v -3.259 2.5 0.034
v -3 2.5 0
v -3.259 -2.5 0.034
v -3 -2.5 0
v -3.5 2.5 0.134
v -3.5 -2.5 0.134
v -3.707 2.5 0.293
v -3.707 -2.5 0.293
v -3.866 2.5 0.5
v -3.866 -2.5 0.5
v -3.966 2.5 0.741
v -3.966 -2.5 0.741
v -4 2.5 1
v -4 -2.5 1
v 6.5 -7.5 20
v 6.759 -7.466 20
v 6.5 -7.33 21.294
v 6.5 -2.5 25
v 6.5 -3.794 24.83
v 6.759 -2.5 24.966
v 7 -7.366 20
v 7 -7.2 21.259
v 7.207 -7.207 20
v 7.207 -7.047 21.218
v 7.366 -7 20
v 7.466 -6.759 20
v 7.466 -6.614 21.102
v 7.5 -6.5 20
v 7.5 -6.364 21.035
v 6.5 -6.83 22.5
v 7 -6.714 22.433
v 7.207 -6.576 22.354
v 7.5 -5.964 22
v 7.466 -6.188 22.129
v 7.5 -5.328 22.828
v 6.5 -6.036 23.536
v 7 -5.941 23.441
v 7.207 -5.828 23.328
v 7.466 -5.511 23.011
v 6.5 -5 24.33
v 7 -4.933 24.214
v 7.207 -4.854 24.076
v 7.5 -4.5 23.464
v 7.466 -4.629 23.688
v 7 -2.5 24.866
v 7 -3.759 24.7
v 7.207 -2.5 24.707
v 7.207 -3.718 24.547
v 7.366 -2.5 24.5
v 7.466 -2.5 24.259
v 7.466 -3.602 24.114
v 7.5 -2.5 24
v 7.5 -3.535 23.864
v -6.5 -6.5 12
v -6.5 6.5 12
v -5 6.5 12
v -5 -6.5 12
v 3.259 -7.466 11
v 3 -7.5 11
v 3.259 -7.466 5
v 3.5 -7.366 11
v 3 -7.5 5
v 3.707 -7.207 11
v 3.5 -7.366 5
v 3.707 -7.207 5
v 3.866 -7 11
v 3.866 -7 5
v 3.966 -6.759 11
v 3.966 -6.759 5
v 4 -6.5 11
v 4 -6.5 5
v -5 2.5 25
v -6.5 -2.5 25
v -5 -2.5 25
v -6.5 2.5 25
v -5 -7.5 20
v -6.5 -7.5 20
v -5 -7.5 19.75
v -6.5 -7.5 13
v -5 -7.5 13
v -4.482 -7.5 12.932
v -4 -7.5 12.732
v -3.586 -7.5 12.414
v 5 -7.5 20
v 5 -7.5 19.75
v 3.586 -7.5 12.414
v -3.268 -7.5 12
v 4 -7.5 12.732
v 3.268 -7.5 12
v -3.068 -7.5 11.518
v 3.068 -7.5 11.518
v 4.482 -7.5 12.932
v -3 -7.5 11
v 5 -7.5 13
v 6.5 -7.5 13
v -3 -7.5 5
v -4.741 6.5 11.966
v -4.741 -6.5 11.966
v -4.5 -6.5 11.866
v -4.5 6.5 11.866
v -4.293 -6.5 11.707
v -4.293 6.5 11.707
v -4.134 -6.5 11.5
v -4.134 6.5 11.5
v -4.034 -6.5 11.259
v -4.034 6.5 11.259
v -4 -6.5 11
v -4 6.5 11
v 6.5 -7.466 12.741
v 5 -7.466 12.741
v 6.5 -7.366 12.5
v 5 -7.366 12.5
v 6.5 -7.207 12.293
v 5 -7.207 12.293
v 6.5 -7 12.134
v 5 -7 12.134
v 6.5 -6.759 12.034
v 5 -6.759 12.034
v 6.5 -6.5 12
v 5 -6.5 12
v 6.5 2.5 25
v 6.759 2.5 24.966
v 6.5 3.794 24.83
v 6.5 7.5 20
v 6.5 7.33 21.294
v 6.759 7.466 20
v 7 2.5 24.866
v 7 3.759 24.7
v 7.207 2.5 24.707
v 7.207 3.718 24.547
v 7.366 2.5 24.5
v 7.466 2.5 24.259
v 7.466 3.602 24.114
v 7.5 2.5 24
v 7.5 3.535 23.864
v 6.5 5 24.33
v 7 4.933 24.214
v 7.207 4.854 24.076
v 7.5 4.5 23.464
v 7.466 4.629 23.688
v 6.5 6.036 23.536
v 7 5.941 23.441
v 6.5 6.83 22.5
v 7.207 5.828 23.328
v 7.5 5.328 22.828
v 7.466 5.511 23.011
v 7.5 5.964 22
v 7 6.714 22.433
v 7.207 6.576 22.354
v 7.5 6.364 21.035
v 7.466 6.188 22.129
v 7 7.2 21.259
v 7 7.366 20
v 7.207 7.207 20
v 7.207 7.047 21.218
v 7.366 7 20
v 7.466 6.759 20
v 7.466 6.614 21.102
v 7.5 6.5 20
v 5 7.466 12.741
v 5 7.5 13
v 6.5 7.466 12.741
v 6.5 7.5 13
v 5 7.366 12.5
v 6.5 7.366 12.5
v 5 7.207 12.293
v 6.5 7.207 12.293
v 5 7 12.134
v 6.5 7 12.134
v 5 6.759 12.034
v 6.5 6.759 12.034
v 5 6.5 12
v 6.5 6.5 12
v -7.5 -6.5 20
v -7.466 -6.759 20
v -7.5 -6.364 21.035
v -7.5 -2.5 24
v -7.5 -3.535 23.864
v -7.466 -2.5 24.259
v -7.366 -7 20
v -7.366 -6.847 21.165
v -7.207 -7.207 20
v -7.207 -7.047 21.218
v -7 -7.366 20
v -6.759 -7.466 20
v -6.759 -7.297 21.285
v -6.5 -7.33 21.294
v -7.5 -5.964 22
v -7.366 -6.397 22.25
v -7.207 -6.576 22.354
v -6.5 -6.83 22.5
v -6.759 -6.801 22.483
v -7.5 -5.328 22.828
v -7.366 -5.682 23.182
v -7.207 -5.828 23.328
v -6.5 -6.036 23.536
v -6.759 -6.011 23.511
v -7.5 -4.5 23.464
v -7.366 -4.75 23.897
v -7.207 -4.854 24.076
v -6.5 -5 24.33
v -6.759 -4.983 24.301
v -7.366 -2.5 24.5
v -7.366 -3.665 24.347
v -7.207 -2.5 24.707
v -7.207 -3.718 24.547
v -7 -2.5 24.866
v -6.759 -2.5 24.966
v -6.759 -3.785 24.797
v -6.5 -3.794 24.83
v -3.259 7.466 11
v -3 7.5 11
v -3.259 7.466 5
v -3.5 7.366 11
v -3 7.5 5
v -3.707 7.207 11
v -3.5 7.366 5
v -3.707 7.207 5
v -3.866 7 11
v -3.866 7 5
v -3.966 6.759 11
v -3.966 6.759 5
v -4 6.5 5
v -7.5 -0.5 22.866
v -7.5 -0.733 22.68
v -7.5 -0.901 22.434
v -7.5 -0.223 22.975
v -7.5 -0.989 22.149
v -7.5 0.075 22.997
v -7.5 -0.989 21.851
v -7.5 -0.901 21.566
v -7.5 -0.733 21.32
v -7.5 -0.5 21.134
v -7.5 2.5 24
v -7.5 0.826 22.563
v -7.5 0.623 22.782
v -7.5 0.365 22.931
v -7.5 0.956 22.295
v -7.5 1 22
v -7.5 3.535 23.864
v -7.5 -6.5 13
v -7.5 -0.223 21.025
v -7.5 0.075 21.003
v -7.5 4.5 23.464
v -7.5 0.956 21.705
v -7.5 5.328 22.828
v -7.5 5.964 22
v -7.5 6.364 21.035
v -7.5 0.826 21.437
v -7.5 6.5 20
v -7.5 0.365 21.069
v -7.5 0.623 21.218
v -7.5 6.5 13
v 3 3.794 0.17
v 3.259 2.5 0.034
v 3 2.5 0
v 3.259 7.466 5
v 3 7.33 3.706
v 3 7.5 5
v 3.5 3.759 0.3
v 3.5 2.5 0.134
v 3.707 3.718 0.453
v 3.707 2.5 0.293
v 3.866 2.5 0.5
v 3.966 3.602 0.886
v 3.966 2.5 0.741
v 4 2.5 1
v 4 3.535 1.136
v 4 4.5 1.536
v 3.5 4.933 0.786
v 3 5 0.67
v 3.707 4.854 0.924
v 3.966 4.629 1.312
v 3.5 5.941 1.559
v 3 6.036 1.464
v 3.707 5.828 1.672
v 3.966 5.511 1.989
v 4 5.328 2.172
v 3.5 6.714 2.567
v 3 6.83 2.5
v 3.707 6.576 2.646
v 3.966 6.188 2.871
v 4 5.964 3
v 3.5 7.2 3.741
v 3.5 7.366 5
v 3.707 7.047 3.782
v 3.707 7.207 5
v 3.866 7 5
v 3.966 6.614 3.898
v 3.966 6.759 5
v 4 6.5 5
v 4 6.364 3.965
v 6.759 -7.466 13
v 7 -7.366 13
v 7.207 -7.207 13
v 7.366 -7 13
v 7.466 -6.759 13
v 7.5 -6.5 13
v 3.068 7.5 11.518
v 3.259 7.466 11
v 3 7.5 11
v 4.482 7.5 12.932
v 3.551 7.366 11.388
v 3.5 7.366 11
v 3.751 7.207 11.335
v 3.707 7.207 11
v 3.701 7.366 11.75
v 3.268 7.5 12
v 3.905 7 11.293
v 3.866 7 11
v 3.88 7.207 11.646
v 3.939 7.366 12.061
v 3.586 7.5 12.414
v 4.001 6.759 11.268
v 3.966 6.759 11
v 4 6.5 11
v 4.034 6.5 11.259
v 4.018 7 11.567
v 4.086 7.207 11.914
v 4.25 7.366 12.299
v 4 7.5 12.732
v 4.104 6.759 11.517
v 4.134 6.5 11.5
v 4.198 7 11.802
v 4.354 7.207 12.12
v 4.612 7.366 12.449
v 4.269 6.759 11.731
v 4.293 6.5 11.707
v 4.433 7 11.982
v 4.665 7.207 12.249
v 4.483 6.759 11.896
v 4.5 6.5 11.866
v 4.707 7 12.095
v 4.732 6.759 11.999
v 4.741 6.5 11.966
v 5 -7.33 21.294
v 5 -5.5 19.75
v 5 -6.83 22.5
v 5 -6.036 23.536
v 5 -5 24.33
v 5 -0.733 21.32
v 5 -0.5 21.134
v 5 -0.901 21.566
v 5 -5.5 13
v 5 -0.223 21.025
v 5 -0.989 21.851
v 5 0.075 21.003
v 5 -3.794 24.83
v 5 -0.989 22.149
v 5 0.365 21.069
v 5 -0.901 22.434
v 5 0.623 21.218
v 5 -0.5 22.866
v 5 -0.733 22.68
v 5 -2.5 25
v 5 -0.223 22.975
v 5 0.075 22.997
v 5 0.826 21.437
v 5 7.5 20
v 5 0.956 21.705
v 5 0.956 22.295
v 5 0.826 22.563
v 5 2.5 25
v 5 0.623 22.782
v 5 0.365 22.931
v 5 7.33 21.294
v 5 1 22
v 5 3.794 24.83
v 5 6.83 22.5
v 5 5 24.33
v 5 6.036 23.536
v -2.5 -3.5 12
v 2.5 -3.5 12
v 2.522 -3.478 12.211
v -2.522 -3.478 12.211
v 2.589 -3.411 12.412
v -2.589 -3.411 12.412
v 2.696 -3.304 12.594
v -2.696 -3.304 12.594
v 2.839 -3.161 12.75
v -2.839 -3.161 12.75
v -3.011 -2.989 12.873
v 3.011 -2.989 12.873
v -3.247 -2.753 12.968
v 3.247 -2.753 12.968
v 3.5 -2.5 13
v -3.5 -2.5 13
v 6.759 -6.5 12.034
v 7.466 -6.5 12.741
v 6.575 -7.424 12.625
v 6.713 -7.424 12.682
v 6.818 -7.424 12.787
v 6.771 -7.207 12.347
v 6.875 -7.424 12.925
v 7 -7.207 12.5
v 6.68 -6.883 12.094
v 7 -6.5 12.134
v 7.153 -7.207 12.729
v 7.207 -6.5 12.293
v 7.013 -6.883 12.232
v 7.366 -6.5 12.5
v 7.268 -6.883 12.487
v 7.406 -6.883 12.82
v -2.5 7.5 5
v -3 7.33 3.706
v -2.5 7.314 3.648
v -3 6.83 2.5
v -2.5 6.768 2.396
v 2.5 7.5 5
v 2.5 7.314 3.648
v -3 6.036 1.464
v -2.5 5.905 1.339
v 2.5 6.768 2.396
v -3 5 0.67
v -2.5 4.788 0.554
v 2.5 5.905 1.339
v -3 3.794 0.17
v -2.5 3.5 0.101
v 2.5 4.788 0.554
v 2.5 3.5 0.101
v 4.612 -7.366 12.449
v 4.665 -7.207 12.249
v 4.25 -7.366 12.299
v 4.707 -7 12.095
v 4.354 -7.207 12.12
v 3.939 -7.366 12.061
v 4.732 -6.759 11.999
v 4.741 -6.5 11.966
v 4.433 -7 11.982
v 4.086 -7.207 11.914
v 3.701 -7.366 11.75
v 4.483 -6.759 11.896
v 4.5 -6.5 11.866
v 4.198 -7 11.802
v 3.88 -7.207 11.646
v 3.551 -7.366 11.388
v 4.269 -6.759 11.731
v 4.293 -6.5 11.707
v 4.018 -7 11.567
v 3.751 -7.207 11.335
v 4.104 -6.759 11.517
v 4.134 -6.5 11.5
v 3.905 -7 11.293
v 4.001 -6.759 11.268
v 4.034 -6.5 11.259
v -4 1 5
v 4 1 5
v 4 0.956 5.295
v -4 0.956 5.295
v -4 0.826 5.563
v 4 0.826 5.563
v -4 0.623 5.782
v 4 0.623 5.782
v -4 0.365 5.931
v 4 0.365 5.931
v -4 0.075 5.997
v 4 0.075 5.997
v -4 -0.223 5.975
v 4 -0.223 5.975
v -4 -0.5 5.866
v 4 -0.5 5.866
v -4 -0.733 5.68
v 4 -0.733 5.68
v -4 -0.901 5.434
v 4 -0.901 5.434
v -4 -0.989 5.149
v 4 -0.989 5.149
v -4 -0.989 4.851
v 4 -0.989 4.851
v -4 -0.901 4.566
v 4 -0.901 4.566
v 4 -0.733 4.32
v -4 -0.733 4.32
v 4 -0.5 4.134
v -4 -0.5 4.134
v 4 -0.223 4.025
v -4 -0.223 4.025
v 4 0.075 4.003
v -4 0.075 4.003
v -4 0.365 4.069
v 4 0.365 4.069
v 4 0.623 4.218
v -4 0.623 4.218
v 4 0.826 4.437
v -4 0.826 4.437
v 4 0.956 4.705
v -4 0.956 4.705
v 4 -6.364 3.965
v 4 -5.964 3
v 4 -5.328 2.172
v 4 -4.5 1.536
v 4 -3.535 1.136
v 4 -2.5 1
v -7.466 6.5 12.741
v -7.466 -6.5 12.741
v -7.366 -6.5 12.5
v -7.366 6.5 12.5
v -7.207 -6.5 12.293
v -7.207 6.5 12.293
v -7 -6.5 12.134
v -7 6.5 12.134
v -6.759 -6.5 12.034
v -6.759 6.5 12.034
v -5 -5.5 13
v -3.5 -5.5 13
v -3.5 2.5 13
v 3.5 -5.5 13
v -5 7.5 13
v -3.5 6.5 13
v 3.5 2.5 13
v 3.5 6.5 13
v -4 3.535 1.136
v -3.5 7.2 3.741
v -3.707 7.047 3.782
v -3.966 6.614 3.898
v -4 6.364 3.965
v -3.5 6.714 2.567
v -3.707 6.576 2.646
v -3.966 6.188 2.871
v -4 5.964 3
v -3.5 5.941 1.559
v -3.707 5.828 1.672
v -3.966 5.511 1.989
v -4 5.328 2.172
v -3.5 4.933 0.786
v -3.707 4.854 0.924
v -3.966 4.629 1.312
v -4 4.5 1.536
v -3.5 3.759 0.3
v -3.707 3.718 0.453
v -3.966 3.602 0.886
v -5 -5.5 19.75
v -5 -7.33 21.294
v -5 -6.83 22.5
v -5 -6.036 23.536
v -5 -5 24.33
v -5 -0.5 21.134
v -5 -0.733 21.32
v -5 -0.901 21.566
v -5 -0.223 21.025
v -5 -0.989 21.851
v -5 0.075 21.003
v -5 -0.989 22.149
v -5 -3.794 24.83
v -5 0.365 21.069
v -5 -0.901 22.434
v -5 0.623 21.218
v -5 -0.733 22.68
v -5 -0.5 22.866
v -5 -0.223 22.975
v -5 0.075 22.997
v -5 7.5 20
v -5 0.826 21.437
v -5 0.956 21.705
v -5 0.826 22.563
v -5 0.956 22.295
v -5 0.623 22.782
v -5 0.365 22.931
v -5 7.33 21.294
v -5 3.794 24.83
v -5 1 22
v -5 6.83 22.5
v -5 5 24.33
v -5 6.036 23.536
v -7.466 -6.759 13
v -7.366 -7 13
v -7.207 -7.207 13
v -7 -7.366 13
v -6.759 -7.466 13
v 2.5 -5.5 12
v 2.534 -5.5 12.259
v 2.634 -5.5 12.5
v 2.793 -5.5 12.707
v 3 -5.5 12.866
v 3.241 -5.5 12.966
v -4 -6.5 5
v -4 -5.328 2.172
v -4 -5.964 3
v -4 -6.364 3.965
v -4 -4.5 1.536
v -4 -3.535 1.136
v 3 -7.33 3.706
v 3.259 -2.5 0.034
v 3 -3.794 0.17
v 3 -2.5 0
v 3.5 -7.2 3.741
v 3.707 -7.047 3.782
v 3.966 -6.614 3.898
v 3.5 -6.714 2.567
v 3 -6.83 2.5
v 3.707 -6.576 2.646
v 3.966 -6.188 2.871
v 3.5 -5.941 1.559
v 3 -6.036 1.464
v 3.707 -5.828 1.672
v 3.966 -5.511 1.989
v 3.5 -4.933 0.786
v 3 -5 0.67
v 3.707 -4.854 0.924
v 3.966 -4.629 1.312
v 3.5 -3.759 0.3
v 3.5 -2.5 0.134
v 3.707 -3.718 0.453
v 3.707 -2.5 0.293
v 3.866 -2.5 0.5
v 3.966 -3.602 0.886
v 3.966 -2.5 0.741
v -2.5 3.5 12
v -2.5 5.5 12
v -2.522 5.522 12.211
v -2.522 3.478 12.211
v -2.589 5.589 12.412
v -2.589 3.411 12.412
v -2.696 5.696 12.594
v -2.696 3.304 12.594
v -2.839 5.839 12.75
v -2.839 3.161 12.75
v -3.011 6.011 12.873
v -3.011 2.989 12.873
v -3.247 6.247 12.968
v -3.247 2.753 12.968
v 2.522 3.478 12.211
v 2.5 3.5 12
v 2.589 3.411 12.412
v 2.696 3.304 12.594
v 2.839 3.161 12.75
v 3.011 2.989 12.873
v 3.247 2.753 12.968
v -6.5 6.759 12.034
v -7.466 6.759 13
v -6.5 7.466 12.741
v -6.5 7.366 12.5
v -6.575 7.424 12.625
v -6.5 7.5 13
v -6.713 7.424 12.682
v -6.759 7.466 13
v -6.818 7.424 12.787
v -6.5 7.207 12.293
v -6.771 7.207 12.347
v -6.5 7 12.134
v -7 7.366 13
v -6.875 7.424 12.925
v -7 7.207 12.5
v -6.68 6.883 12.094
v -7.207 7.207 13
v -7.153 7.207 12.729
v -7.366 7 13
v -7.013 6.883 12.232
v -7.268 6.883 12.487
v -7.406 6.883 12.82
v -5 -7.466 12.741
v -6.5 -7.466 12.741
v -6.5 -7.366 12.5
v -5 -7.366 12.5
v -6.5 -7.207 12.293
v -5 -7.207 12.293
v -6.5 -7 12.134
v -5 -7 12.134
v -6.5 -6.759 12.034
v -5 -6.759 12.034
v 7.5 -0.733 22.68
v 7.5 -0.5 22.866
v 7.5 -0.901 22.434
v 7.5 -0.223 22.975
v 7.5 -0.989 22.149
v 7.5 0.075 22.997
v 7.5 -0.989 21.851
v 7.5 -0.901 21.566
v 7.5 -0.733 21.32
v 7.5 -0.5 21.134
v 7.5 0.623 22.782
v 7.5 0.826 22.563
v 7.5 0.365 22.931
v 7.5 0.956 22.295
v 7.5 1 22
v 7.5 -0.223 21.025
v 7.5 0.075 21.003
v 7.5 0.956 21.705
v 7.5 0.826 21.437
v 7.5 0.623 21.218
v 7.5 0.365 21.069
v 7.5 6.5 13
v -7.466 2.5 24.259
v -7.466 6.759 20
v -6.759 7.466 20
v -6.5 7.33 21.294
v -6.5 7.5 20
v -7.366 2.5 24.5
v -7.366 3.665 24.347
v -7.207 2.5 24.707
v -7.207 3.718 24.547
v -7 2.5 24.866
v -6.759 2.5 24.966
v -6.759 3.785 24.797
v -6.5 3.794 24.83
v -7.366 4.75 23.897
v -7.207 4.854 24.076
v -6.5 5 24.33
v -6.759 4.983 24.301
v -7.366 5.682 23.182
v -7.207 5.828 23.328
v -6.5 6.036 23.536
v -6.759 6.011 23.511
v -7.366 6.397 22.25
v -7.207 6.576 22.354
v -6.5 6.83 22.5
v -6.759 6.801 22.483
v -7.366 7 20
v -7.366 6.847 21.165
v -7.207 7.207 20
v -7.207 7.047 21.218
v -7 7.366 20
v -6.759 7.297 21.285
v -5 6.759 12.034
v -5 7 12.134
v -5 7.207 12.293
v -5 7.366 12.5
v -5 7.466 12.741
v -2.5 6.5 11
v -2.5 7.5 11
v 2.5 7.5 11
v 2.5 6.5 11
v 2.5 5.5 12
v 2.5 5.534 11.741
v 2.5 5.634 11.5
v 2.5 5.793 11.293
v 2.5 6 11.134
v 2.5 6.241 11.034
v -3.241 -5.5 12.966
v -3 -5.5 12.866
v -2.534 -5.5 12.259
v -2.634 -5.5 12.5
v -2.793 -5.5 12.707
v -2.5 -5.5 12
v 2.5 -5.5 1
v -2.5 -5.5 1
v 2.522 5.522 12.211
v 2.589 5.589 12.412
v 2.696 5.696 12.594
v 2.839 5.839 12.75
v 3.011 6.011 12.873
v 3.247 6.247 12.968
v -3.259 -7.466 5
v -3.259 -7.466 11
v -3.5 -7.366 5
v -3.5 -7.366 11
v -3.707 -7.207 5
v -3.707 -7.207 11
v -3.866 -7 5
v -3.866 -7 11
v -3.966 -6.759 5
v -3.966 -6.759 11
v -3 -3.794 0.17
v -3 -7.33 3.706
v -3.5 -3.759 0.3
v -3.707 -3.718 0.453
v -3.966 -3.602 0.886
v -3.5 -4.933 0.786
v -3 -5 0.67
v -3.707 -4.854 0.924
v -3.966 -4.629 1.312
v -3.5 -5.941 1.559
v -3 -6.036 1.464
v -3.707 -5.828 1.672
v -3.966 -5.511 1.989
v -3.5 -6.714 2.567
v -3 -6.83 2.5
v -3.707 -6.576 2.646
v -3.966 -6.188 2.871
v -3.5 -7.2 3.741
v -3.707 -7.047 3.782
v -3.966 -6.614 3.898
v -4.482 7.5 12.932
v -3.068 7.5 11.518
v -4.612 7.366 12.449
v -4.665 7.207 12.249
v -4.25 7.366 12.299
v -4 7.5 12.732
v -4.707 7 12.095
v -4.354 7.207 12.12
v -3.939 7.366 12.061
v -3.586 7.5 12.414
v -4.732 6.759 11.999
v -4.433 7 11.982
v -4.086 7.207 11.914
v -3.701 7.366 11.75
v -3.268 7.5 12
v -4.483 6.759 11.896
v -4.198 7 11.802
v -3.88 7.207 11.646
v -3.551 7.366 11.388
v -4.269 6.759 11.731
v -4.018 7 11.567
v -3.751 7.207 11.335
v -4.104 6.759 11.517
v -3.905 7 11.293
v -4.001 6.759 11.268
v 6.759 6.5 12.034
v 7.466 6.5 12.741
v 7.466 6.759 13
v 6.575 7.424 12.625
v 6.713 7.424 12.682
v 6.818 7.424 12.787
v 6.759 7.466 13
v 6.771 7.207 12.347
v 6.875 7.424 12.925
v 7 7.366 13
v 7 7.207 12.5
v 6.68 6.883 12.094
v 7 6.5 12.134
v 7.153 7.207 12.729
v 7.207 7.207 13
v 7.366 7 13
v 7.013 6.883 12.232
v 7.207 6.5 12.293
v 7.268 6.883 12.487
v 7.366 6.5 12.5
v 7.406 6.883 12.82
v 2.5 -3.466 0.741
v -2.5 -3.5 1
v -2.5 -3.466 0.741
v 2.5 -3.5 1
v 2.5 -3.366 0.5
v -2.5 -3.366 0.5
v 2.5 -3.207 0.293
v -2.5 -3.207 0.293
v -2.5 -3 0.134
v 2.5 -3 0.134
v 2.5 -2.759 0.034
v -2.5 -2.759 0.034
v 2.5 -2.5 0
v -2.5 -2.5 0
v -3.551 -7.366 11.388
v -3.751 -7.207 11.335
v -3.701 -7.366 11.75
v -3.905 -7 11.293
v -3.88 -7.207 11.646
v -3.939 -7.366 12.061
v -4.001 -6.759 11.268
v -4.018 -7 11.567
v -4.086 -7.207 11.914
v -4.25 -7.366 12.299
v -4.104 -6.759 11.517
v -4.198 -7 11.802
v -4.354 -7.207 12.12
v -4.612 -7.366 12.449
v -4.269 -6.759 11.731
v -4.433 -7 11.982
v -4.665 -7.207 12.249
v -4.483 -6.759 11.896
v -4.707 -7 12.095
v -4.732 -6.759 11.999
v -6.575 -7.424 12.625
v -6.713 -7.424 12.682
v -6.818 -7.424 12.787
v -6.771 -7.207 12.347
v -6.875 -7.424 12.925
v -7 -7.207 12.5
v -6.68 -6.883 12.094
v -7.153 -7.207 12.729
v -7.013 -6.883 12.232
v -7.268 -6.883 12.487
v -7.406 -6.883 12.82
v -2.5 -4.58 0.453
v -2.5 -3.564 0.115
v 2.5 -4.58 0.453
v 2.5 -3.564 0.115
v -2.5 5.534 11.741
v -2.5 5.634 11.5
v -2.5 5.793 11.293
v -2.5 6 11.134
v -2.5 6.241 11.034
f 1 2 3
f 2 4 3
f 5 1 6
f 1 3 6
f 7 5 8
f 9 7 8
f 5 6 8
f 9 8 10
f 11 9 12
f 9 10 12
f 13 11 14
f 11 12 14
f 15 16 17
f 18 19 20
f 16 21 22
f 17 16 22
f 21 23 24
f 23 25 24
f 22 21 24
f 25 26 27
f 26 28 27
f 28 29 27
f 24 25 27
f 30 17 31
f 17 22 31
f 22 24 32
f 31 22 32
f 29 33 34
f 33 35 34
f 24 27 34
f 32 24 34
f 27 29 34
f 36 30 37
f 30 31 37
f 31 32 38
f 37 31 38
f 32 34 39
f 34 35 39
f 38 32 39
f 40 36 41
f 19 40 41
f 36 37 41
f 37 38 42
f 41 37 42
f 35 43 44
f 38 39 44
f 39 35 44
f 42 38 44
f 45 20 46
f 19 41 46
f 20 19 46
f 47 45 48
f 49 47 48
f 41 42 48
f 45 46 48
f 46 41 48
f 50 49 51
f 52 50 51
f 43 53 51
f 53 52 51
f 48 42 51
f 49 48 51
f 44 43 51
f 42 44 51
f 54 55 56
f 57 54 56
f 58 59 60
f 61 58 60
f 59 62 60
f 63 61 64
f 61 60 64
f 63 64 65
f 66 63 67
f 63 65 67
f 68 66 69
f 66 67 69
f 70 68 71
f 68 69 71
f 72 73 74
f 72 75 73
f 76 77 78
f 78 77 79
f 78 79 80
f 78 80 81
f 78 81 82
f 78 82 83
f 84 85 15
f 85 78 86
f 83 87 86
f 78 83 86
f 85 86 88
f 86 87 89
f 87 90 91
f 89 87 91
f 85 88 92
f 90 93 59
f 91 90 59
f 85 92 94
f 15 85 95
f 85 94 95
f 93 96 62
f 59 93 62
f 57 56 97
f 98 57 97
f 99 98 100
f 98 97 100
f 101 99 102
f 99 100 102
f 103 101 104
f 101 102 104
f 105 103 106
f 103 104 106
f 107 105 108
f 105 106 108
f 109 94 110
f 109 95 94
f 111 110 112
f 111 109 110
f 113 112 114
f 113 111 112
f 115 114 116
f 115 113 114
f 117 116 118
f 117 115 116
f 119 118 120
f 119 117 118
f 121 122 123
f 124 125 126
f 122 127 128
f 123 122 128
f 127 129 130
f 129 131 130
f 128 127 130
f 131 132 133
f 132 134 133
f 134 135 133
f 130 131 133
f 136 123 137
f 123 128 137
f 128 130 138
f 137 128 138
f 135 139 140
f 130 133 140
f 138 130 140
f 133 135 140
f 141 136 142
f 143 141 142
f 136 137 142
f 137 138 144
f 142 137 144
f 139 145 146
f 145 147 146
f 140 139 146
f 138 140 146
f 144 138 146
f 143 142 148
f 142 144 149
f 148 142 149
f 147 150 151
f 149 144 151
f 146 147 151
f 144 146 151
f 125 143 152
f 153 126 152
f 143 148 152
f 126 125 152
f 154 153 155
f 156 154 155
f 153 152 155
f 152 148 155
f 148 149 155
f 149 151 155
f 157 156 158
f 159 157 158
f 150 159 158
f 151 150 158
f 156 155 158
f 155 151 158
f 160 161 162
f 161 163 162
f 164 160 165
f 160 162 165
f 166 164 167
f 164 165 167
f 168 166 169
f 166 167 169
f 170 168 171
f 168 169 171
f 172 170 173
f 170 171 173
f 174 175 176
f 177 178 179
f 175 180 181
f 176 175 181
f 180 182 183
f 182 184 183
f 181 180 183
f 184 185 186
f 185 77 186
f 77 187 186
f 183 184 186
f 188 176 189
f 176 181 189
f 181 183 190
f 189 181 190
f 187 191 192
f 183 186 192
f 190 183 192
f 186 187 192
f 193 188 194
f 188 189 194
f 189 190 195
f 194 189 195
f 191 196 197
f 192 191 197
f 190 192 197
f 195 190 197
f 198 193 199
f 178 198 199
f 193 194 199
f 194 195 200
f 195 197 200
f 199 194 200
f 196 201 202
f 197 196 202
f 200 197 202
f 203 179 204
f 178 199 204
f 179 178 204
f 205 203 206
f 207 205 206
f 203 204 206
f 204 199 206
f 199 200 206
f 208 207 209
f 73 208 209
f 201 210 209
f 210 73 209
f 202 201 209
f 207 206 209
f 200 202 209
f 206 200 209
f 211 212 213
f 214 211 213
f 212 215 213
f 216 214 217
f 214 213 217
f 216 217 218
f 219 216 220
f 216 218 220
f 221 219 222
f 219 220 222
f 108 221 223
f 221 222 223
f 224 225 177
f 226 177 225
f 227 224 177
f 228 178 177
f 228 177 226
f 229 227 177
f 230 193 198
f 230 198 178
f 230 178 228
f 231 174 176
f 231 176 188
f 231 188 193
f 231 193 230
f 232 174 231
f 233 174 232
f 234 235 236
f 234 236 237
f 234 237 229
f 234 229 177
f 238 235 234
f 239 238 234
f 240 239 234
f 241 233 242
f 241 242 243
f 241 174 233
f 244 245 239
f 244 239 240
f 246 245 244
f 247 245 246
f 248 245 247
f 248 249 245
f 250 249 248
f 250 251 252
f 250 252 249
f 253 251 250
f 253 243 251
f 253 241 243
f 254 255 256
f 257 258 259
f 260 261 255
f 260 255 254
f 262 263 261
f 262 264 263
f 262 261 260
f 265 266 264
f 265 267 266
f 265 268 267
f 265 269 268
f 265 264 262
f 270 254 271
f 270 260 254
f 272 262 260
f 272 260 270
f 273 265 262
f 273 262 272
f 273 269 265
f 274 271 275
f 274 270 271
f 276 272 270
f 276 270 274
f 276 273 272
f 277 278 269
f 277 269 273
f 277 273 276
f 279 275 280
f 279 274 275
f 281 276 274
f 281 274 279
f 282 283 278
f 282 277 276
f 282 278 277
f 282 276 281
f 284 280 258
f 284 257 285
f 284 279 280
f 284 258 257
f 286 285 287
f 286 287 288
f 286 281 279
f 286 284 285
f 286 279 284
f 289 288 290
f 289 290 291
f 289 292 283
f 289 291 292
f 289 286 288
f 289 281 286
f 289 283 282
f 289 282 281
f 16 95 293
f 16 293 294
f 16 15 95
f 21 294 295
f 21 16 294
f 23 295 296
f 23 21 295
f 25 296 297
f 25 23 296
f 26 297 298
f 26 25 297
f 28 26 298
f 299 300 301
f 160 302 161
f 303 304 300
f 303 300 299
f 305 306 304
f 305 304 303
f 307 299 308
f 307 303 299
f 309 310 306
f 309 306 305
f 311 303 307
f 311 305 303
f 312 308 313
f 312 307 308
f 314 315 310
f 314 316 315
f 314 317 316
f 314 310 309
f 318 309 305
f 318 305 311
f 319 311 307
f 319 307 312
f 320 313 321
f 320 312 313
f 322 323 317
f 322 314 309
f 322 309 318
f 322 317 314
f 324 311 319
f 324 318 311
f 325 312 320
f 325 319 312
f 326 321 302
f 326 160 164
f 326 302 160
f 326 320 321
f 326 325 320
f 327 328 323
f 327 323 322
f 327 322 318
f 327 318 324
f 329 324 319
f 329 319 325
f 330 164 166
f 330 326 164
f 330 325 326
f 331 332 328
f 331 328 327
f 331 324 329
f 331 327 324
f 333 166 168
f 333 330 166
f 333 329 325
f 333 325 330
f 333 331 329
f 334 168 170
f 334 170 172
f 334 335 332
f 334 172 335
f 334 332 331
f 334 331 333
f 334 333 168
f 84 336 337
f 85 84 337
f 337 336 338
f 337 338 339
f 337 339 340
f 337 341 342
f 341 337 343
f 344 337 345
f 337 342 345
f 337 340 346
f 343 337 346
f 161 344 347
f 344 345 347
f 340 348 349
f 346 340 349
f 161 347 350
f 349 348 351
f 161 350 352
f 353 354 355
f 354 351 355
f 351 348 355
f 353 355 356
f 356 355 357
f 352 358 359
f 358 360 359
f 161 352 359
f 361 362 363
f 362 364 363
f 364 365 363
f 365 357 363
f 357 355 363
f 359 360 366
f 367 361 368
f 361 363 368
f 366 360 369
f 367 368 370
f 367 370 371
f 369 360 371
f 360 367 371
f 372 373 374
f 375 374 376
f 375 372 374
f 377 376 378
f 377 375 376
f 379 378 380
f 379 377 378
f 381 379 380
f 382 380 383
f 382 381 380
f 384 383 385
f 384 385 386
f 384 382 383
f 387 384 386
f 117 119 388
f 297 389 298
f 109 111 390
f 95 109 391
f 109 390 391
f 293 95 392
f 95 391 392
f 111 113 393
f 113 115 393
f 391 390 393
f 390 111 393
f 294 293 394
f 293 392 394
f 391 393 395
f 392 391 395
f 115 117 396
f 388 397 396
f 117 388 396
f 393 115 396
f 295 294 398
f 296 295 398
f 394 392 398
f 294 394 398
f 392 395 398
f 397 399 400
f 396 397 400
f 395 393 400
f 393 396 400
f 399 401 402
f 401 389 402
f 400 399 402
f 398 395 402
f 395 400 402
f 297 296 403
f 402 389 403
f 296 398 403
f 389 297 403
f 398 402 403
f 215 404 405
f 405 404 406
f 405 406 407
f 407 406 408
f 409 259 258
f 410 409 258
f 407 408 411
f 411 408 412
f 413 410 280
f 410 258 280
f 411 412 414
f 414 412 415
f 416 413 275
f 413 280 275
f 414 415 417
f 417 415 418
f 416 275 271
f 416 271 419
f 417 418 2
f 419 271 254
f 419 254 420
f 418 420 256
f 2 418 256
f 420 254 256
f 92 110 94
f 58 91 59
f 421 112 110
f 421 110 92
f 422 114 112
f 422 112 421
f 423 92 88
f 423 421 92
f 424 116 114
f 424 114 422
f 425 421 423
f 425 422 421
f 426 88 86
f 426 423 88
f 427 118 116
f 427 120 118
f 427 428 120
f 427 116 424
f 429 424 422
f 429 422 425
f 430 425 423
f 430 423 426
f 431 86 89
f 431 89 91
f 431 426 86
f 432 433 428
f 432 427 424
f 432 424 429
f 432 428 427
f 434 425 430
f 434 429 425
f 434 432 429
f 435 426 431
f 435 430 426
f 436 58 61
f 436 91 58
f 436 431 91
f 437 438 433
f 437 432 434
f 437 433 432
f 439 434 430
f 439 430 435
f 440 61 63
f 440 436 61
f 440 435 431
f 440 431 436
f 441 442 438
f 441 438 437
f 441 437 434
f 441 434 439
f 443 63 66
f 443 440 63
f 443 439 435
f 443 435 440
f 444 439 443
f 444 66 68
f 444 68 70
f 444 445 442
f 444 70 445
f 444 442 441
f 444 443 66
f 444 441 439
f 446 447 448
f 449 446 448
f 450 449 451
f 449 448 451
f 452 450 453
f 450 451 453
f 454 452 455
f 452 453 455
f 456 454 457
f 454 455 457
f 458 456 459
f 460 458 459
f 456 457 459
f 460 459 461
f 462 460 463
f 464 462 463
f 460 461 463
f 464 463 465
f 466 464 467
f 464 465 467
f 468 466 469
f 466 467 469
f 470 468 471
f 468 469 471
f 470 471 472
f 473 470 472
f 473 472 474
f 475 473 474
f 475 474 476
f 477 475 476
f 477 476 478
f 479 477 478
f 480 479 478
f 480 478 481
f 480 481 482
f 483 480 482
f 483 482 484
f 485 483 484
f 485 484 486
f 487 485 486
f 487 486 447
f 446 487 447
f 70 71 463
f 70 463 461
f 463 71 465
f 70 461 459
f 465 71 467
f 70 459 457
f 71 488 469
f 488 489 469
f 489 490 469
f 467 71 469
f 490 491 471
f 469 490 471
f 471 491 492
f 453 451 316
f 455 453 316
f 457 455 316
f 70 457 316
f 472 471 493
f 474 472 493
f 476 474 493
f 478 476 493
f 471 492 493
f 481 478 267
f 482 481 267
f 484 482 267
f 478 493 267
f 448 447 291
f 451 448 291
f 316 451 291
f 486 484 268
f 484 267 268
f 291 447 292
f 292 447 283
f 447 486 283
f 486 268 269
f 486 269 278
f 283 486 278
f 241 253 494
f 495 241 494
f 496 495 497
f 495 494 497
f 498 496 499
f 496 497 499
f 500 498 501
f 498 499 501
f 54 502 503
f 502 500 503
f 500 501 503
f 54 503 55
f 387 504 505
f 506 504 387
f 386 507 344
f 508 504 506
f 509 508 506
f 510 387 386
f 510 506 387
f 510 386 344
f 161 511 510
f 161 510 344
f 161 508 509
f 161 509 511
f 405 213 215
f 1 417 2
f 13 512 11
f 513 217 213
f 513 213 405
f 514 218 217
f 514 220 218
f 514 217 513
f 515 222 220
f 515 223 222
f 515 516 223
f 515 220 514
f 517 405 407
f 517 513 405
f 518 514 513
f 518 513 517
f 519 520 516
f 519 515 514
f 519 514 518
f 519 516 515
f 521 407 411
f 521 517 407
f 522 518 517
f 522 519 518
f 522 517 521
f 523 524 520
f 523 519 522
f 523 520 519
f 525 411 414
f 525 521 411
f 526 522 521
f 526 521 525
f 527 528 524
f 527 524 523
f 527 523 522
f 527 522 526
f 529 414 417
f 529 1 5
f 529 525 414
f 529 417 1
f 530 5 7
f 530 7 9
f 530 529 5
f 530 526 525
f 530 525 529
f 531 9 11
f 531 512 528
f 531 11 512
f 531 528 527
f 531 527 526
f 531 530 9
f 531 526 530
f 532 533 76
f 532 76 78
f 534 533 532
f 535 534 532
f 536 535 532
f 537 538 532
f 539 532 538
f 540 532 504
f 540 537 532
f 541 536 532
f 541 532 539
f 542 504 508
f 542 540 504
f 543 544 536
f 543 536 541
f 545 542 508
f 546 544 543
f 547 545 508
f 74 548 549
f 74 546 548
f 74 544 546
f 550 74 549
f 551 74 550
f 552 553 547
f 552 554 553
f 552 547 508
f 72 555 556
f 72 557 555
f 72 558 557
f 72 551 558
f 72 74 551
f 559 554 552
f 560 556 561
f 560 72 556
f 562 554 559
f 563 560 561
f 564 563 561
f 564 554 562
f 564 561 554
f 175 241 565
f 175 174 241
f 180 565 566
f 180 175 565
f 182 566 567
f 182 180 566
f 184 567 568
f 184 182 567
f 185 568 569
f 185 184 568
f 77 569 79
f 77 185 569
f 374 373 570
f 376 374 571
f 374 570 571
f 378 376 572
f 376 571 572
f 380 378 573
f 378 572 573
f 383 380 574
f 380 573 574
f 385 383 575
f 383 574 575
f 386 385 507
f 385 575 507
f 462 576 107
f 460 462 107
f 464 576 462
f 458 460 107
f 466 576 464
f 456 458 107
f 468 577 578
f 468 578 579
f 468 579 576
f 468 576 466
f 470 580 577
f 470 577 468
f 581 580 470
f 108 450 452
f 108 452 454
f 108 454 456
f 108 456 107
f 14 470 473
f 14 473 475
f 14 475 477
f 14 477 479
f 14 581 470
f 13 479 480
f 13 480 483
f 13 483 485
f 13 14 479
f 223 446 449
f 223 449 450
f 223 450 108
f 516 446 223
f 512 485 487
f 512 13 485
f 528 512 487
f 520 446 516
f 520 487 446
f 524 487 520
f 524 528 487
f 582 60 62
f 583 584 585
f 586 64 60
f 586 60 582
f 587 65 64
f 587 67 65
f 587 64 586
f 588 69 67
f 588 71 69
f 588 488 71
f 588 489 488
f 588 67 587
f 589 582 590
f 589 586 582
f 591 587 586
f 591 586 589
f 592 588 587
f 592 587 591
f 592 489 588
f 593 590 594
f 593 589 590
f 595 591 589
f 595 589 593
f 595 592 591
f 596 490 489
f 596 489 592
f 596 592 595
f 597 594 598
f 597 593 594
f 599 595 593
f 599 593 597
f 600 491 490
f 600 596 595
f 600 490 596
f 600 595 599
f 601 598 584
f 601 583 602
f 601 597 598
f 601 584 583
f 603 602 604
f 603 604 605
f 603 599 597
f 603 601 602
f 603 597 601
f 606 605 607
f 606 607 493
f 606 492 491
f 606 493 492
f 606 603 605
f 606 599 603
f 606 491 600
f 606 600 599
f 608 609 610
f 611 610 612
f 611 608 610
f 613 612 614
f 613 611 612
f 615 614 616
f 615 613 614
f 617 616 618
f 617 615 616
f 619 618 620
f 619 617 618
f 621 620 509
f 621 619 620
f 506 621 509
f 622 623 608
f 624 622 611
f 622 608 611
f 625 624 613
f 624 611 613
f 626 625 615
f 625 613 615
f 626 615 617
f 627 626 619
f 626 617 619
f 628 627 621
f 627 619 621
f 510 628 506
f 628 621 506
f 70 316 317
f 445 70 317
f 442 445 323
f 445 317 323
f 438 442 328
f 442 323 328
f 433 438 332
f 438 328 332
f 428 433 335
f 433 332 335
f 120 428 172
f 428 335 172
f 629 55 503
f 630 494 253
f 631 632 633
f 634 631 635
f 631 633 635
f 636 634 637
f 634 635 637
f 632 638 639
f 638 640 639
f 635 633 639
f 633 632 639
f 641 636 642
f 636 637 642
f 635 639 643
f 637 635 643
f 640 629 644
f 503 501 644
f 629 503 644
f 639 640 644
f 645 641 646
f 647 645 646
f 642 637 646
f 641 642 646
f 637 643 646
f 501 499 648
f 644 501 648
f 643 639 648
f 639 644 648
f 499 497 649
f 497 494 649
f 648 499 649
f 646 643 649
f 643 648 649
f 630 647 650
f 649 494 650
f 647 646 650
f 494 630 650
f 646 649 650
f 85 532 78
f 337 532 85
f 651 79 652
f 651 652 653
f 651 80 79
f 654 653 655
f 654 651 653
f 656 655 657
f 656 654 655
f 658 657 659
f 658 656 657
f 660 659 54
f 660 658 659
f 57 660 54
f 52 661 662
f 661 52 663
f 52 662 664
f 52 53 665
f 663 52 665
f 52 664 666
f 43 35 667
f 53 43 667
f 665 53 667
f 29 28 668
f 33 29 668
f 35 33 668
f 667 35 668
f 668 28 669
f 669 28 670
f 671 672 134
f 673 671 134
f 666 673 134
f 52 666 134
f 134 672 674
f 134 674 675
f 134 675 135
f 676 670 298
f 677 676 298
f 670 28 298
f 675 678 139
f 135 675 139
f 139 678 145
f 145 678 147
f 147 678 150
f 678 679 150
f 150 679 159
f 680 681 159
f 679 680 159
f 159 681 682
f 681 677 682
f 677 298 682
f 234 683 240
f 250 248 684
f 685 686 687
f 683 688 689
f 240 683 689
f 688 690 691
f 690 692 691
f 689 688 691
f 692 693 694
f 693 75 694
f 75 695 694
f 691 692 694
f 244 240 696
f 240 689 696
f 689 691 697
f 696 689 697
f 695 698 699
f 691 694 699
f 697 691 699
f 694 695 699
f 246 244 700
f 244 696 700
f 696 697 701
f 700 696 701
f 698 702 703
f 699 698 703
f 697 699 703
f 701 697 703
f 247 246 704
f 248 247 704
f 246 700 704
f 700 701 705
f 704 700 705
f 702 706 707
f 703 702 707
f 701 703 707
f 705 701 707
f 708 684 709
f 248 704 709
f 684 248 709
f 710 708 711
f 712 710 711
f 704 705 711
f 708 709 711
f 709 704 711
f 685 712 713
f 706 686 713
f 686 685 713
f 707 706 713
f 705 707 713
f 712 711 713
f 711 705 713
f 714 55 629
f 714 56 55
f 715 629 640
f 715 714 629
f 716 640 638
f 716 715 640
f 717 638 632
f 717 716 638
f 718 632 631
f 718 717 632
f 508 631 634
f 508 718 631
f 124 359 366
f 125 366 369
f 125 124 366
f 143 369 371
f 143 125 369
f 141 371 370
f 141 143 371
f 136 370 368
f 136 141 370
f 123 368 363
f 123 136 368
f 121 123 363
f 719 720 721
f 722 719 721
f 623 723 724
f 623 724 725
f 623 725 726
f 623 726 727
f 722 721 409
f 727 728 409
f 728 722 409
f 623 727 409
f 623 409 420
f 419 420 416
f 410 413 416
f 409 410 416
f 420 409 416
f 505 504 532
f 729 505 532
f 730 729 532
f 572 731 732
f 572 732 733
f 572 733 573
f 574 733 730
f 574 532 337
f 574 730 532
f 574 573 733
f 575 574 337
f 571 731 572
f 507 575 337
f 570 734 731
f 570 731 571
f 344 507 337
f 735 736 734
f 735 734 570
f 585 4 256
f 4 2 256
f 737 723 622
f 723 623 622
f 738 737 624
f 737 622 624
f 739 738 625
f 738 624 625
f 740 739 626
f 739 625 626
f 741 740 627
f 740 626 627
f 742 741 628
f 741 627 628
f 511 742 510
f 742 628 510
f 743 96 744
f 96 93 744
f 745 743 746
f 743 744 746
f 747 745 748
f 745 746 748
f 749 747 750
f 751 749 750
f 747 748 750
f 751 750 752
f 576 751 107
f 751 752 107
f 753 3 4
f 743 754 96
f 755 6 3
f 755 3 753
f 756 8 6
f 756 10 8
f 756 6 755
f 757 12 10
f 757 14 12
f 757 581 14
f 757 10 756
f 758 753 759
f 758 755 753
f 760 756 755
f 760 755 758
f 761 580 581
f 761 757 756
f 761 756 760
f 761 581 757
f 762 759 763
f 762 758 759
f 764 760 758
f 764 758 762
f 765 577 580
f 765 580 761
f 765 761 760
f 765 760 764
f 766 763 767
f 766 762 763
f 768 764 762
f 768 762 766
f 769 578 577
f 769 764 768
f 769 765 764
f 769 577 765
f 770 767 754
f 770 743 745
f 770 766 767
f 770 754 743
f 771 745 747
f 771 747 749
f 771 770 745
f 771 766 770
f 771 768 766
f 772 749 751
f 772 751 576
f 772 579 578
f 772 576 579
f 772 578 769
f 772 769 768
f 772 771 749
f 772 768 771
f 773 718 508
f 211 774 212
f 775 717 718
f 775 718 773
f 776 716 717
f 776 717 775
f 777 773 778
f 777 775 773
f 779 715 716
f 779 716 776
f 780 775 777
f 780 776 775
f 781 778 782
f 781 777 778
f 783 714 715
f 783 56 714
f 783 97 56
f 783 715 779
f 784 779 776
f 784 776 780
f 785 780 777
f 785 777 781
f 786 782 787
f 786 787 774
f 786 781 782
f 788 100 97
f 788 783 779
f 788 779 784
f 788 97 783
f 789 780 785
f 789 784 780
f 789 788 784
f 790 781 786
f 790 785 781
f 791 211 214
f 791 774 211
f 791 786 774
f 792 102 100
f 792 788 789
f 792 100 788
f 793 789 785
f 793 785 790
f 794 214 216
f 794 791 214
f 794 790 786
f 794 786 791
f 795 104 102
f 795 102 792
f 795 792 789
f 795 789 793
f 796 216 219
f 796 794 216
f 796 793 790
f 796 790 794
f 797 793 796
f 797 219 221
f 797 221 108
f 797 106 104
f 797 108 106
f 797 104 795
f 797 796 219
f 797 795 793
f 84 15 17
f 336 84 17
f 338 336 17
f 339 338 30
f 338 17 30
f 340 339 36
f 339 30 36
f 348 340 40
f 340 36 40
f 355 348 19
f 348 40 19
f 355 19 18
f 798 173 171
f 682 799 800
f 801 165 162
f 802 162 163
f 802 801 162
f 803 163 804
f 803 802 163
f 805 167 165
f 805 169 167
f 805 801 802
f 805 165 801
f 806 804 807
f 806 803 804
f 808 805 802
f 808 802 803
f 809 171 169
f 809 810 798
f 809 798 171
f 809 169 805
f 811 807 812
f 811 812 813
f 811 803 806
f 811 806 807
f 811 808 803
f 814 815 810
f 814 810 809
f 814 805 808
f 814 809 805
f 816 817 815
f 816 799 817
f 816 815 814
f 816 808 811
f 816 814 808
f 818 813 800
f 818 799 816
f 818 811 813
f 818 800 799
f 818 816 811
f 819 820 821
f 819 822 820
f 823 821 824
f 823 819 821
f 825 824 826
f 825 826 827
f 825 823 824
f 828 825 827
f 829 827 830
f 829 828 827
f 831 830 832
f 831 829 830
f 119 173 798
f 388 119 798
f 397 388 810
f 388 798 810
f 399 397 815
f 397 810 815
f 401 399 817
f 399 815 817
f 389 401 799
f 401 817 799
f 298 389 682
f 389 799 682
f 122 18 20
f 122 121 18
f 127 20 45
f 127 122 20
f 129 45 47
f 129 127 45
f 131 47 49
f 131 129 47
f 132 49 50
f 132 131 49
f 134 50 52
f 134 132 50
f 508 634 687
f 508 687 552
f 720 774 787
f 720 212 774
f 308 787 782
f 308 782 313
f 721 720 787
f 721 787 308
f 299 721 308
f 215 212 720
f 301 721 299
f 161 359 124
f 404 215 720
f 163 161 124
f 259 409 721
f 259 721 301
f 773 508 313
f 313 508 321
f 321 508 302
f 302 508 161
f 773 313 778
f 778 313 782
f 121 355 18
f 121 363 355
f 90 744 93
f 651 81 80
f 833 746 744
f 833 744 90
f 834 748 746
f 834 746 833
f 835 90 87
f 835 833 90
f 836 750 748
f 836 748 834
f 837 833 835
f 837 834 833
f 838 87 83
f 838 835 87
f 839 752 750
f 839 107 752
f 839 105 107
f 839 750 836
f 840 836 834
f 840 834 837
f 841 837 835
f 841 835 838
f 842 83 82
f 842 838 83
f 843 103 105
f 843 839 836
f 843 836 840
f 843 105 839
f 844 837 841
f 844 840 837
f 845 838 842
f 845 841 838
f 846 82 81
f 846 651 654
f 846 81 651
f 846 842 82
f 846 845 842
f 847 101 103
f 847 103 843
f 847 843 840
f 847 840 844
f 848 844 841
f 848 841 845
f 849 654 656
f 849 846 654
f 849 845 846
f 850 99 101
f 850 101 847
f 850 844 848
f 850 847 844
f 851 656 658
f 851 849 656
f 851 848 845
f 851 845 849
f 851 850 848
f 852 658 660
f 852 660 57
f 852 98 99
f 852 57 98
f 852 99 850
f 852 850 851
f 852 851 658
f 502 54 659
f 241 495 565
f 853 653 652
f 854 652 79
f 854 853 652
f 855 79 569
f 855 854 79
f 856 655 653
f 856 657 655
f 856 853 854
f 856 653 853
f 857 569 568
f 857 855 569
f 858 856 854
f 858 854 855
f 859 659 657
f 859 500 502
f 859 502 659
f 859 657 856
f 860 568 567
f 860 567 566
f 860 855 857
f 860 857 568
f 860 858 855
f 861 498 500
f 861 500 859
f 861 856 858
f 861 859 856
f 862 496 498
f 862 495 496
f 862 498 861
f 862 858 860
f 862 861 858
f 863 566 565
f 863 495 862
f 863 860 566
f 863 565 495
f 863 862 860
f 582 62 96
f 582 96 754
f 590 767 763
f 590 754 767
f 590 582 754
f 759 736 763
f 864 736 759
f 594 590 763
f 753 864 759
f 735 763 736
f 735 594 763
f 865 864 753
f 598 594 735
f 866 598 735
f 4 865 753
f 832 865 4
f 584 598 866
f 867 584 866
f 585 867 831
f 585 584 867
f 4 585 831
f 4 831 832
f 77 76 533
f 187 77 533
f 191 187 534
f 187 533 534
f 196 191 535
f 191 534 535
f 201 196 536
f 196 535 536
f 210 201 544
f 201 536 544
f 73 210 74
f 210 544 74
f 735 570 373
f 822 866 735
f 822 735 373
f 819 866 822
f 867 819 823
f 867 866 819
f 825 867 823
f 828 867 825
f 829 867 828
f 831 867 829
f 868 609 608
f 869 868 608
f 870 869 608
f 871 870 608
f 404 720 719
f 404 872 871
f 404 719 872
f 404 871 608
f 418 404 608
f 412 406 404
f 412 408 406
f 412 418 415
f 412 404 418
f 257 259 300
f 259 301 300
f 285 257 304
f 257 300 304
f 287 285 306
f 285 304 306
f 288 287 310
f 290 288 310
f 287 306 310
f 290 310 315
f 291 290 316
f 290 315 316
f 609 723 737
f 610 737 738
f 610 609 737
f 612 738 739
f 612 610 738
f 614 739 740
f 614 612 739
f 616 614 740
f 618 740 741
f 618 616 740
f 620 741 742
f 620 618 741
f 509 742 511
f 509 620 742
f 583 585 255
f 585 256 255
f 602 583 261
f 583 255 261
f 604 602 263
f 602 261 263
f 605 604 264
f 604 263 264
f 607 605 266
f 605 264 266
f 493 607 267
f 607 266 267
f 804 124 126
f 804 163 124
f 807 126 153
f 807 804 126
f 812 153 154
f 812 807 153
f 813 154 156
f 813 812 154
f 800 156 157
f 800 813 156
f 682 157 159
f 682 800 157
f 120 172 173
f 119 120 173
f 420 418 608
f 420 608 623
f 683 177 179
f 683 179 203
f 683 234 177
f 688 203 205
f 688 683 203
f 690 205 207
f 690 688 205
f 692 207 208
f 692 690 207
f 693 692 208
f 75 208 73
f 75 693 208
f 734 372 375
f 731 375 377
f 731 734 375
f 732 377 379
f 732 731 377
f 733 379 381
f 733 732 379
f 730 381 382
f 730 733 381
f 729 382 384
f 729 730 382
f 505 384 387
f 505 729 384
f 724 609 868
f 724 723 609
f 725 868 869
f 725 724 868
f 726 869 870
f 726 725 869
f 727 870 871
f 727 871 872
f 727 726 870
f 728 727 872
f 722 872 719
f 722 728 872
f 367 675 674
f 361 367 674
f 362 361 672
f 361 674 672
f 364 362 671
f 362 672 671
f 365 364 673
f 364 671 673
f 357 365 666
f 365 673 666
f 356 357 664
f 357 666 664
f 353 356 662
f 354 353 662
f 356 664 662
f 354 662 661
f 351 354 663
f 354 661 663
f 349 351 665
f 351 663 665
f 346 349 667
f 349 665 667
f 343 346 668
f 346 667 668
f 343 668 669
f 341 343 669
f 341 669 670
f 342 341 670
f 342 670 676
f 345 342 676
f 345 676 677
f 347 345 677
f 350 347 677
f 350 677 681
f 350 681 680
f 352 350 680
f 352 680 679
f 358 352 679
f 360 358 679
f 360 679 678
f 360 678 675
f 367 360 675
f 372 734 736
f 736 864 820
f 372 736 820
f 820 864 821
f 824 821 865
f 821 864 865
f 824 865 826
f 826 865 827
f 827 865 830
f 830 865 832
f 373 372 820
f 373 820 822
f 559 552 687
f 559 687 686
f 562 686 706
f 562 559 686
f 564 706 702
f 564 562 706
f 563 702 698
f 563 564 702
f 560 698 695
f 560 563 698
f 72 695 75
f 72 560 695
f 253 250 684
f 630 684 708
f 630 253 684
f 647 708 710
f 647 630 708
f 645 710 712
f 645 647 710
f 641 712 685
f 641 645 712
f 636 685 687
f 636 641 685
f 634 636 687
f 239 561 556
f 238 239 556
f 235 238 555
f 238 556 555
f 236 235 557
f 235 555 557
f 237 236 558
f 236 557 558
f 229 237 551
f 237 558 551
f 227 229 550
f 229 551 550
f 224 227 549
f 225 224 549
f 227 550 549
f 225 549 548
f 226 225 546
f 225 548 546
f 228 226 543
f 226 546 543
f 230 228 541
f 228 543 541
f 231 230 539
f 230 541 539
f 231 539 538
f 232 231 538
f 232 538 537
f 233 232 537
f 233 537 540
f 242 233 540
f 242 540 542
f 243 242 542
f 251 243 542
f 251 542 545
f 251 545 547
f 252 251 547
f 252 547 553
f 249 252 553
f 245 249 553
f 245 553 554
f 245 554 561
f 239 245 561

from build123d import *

# Parameters (mm, degrees)
BASE_SKETCH_W                    = 15
BASE_SKETCH_H                    = 15
BASE_SKETCH_EXTRUDE_DEPTH        = 25
CENTER_NUB_CUTOUT_SKETCH_W       = 3.5
CENTER_NUB_CUTOUT_SKETCH_H       = 15
HINGE_NUB_EXTRUDED_CUT_DEPTH     = 12
HINGE_CUTOUT_SKETCH_W            = 10
HINGE_CUTOUT_SKETCH_H            = 15
HINGE_CUTOUT_EXTRUDED_CUT_DEPTH  = 12
HINGE_HOLE_SKETCH_R              = 1
HINGE_HOLE_EXTRUDED_CUT_DEPTH    = 31.103986447
CORNER_FILLETS_R                 = 5
STYLE_FILLETS_R                  = 1
ROUTING_HOLES_SKETCH_W           = 5
ROUTING_HOLES_SKETCH_H           = 2
ROUTING_HOLES_EXTRUDED_CUT_DEPTH = 28.156951228
SKETCH1_W                        = 10
SKETCH1_H                        = 2
BACKING_EXTRUDE_DEPTH            = 6.75
EXTRA_ROUTING_CUT_SKETCH_W       = 5
EXTRA_ROUTING_CUT_SKETCH_H       = 10
EXTRA_ROUTING_EXTRUDED_CUT_DEPTH = 4
ROUTING_FILLETS_R                = 1


with BuildPart() as part:
    # Base Sketch → Base Sketch Extrude (new body)
    with BuildSketch(Plane.XY):
        Rectangle(BASE_SKETCH_W, BASE_SKETCH_H)
    extrude(amount=BASE_SKETCH_EXTRUDE_DEPTH)

    # Center Nub Cutout Sketch → Hinge Nub Extruded Cut (cut)
    with BuildSketch(Plane.XY):
        with Locations((5.75, 0)):
            Rectangle(CENTER_NUB_CUTOUT_SKETCH_W, CENTER_NUB_CUTOUT_SKETCH_H)
        with Locations((-5.75, 0)):
            Rectangle(CENTER_NUB_CUTOUT_SKETCH_W, CENTER_NUB_CUTOUT_SKETCH_H)
    extrude(amount=HINGE_NUB_EXTRUDED_CUT_DEPTH, mode=Mode.SUBTRACT)

    # Hinge Cutout Sketch → Hinge Cutout Extruded Cut (cut)
    with BuildSketch(Plane.XY.offset(25)):
        Rectangle(HINGE_CUTOUT_SKETCH_W, HINGE_CUTOUT_SKETCH_H)
    extrude(amount=-HINGE_CUTOUT_EXTRUDED_CUT_DEPTH, mode=Mode.SUBTRACT)

    # Hinge Hole Sketch → Hinge Hole Extruded Cut (cut, through all)
    with BuildSketch(Plane(origin=(7.5, 0, 0), x_dir=(0, 0, -1), z_dir=(1, 0, 0))):
        with Locations(Location((-5, 0, 0), (0, 0, 90))):
            Circle(HINGE_HOLE_SKETCH_R)
        with Locations(Location((-22, 0, 0), (0, 0, 90))):
            Circle(HINGE_HOLE_SKETCH_R)
    extrude(amount=-HINGE_HOLE_EXTRUDED_CUT_DEPTH, mode=Mode.SUBTRACT)

    # Corner Fillets
    corner_fillets_edges = [part.edges().sort_by_distance(p)[0] for p in [
        (0, -7.5, 0),
        (0, 7.5, 0),
        (-6.25, -7.5, 25),
        (-6.25, 7.5, 25),
        (6.25, -7.5, 25),
        (6.25, 7.5, 25),
    ]]
    fillet(corner_fillets_edges, radius=CORNER_FILLETS_R)

    # Style Fillets
    style_fillets_edges = [part.edges().sort_by_distance(p)[0] for p in [
        (4, 7.5, 8.5),
        (4, -7.5, 8.5),
        (7.5, 0, 12),
        (5.75, 7.5, 12),
        (4, 0, 12),
        (5.75, -7.5, 12),
        (-4, -7.5, 8.5),
        (-4, 7.5, 8.5),
        (-7.5, 0, 12),
        (-5.75, -7.5, 12),
        (-4, 0, 12),
        (-5.75, 7.5, 12),
        (-7.5, 0, 25),
        (-7.5, -7.5, 16),
        (7.5, -7.5, 16),
        (-7.5, 7.5, 16),
        (-7.5, 6.035533906, 23.535533906),
        (-7.5, -6.035533906, 23.535533906),
        (7.5, 7.5, 16),
        (7.5, 0, 25),
        (7.5, 6.035533906, 23.535533906),
        (7.5, -6.035533906, 23.535533906),
        (4, 0, 0),
        (4, 6.035533906, 1.464466094),
        (4, -6.035533906, 1.464466094),
        (-4, 0, 0),
        (-4, 6.035533906, 1.464466094),
        (-4, -6.035533906, 1.464466094),
    ]]
    fillet(style_fillets_edges, radius=STYLE_FILLETS_R)

    # Routing Holes Sketch → Routing Holes Extruded Cut (cut, through all)
    with BuildSketch(Plane.XY):
        with Locations((0, 4.5)):
            Rectangle(ROUTING_HOLES_SKETCH_W, ROUTING_HOLES_SKETCH_H)
        with Locations((0, -4.5)):
            Rectangle(ROUTING_HOLES_SKETCH_W, ROUTING_HOLES_SKETCH_H)
    extrude(amount=ROUTING_HOLES_EXTRUDED_CUT_DEPTH, mode=Mode.SUBTRACT)

    # Sketch1 → Backing Extrude (add)
    with BuildSketch(Plane.XY.offset(13)):
        with Locations((0, -6.5)):
            Rectangle(SKETCH1_W, SKETCH1_H)
    extrude(amount=BACKING_EXTRUDE_DEPTH)

    # Extra Routing Cut Sketch → Extra Routing Extruded Cut (cut)
    with BuildSketch(Plane(origin=(0, 7.5, 0), x_dir=(1, 0, 0), z_dir=(0, 1, 0))):
        with Locations((0, -6)):
            Rectangle(EXTRA_ROUTING_CUT_SKETCH_W, EXTRA_ROUTING_CUT_SKETCH_H)
    extrude(amount=-EXTRA_ROUTING_EXTRUDED_CUT_DEPTH, mode=Mode.SUBTRACT)

    # Routing Fillets
    routing_fillets_edges = [part.edges().sort_by_distance(p)[0] for p in [
        (0, -3.5, 0.101020514),
        (2.5, -4.5, 13),
        (0, -3.5, 13),
        (-2.5, -4.5, 13),
        (2.5, 4.5, 13),
        (0, 3.5, 13),
        (-2.5, 4.5, 13),
        (0, 5.5, 13),
        (0, 5.5, 11),
    ]]
    fillet(routing_fillets_edges, radius=ROUTING_FILLETS_R - 0.0001)  # a hair under: the kernel refuses the full size


solid = part.part
